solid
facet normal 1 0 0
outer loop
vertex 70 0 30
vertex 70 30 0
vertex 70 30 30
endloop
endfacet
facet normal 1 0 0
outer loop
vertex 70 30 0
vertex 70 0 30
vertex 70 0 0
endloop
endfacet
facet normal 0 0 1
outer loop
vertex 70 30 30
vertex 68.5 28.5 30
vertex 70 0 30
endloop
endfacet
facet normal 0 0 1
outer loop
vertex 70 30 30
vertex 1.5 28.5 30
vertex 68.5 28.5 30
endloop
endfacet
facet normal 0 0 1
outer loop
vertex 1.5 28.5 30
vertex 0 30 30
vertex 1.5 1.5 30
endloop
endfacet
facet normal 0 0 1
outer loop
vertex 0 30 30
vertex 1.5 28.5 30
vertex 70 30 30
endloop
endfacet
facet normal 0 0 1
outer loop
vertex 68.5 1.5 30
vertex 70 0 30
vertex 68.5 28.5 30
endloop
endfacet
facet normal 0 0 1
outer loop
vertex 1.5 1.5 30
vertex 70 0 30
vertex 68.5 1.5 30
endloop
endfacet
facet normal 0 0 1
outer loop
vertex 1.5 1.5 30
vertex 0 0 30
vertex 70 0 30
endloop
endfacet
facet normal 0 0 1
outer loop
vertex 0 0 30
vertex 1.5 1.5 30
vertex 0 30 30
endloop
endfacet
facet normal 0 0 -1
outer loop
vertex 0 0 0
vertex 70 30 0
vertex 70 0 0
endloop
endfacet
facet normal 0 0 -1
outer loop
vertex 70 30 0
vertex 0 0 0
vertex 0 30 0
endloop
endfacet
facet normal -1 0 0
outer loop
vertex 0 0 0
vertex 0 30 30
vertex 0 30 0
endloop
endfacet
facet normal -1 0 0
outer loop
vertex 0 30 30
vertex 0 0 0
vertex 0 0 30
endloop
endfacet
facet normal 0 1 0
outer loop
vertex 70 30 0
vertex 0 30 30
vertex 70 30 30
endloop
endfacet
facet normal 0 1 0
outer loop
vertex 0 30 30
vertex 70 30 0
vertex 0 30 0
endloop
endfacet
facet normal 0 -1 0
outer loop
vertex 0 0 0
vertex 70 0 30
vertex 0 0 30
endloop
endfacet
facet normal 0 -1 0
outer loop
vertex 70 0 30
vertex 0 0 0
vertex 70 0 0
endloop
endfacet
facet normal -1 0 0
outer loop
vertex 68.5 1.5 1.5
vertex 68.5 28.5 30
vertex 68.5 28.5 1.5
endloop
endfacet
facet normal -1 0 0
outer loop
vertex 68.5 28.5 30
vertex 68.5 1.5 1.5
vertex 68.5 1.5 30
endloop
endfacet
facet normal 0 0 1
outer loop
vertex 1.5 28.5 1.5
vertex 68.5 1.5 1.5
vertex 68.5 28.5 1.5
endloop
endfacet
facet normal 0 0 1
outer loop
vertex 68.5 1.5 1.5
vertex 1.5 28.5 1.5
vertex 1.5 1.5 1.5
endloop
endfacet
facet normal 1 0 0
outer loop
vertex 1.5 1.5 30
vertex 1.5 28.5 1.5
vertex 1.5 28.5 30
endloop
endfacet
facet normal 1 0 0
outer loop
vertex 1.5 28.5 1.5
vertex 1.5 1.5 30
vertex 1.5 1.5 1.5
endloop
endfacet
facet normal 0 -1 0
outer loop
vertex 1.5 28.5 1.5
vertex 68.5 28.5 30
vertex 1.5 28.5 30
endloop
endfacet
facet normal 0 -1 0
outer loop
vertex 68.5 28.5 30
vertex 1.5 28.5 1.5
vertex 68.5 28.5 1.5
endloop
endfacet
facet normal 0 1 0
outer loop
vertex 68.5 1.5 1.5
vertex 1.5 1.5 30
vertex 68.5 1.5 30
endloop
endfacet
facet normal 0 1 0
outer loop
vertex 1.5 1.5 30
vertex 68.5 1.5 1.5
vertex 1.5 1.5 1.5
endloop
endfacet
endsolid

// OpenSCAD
$fn = 32;

// ----------------------------------------------------------------------
// Open box: 1.5 mm walls
// ----------------------------------------------------------------------

// --- parameters (mm) ---
box_l = 70;               // outer length, X
box_w = 30;               // outer width, Y
box_h = 30;               // outer height, Z
wall = 1.5;               // wall thickness
floor = 1.5;              // floor thickness

difference() {
  cube([box_l, box_w, box_h]);
  translate([wall, wall, floor])
    cube([box_l - 2 * wall, box_w - 2 * wall, box_h]);
}
